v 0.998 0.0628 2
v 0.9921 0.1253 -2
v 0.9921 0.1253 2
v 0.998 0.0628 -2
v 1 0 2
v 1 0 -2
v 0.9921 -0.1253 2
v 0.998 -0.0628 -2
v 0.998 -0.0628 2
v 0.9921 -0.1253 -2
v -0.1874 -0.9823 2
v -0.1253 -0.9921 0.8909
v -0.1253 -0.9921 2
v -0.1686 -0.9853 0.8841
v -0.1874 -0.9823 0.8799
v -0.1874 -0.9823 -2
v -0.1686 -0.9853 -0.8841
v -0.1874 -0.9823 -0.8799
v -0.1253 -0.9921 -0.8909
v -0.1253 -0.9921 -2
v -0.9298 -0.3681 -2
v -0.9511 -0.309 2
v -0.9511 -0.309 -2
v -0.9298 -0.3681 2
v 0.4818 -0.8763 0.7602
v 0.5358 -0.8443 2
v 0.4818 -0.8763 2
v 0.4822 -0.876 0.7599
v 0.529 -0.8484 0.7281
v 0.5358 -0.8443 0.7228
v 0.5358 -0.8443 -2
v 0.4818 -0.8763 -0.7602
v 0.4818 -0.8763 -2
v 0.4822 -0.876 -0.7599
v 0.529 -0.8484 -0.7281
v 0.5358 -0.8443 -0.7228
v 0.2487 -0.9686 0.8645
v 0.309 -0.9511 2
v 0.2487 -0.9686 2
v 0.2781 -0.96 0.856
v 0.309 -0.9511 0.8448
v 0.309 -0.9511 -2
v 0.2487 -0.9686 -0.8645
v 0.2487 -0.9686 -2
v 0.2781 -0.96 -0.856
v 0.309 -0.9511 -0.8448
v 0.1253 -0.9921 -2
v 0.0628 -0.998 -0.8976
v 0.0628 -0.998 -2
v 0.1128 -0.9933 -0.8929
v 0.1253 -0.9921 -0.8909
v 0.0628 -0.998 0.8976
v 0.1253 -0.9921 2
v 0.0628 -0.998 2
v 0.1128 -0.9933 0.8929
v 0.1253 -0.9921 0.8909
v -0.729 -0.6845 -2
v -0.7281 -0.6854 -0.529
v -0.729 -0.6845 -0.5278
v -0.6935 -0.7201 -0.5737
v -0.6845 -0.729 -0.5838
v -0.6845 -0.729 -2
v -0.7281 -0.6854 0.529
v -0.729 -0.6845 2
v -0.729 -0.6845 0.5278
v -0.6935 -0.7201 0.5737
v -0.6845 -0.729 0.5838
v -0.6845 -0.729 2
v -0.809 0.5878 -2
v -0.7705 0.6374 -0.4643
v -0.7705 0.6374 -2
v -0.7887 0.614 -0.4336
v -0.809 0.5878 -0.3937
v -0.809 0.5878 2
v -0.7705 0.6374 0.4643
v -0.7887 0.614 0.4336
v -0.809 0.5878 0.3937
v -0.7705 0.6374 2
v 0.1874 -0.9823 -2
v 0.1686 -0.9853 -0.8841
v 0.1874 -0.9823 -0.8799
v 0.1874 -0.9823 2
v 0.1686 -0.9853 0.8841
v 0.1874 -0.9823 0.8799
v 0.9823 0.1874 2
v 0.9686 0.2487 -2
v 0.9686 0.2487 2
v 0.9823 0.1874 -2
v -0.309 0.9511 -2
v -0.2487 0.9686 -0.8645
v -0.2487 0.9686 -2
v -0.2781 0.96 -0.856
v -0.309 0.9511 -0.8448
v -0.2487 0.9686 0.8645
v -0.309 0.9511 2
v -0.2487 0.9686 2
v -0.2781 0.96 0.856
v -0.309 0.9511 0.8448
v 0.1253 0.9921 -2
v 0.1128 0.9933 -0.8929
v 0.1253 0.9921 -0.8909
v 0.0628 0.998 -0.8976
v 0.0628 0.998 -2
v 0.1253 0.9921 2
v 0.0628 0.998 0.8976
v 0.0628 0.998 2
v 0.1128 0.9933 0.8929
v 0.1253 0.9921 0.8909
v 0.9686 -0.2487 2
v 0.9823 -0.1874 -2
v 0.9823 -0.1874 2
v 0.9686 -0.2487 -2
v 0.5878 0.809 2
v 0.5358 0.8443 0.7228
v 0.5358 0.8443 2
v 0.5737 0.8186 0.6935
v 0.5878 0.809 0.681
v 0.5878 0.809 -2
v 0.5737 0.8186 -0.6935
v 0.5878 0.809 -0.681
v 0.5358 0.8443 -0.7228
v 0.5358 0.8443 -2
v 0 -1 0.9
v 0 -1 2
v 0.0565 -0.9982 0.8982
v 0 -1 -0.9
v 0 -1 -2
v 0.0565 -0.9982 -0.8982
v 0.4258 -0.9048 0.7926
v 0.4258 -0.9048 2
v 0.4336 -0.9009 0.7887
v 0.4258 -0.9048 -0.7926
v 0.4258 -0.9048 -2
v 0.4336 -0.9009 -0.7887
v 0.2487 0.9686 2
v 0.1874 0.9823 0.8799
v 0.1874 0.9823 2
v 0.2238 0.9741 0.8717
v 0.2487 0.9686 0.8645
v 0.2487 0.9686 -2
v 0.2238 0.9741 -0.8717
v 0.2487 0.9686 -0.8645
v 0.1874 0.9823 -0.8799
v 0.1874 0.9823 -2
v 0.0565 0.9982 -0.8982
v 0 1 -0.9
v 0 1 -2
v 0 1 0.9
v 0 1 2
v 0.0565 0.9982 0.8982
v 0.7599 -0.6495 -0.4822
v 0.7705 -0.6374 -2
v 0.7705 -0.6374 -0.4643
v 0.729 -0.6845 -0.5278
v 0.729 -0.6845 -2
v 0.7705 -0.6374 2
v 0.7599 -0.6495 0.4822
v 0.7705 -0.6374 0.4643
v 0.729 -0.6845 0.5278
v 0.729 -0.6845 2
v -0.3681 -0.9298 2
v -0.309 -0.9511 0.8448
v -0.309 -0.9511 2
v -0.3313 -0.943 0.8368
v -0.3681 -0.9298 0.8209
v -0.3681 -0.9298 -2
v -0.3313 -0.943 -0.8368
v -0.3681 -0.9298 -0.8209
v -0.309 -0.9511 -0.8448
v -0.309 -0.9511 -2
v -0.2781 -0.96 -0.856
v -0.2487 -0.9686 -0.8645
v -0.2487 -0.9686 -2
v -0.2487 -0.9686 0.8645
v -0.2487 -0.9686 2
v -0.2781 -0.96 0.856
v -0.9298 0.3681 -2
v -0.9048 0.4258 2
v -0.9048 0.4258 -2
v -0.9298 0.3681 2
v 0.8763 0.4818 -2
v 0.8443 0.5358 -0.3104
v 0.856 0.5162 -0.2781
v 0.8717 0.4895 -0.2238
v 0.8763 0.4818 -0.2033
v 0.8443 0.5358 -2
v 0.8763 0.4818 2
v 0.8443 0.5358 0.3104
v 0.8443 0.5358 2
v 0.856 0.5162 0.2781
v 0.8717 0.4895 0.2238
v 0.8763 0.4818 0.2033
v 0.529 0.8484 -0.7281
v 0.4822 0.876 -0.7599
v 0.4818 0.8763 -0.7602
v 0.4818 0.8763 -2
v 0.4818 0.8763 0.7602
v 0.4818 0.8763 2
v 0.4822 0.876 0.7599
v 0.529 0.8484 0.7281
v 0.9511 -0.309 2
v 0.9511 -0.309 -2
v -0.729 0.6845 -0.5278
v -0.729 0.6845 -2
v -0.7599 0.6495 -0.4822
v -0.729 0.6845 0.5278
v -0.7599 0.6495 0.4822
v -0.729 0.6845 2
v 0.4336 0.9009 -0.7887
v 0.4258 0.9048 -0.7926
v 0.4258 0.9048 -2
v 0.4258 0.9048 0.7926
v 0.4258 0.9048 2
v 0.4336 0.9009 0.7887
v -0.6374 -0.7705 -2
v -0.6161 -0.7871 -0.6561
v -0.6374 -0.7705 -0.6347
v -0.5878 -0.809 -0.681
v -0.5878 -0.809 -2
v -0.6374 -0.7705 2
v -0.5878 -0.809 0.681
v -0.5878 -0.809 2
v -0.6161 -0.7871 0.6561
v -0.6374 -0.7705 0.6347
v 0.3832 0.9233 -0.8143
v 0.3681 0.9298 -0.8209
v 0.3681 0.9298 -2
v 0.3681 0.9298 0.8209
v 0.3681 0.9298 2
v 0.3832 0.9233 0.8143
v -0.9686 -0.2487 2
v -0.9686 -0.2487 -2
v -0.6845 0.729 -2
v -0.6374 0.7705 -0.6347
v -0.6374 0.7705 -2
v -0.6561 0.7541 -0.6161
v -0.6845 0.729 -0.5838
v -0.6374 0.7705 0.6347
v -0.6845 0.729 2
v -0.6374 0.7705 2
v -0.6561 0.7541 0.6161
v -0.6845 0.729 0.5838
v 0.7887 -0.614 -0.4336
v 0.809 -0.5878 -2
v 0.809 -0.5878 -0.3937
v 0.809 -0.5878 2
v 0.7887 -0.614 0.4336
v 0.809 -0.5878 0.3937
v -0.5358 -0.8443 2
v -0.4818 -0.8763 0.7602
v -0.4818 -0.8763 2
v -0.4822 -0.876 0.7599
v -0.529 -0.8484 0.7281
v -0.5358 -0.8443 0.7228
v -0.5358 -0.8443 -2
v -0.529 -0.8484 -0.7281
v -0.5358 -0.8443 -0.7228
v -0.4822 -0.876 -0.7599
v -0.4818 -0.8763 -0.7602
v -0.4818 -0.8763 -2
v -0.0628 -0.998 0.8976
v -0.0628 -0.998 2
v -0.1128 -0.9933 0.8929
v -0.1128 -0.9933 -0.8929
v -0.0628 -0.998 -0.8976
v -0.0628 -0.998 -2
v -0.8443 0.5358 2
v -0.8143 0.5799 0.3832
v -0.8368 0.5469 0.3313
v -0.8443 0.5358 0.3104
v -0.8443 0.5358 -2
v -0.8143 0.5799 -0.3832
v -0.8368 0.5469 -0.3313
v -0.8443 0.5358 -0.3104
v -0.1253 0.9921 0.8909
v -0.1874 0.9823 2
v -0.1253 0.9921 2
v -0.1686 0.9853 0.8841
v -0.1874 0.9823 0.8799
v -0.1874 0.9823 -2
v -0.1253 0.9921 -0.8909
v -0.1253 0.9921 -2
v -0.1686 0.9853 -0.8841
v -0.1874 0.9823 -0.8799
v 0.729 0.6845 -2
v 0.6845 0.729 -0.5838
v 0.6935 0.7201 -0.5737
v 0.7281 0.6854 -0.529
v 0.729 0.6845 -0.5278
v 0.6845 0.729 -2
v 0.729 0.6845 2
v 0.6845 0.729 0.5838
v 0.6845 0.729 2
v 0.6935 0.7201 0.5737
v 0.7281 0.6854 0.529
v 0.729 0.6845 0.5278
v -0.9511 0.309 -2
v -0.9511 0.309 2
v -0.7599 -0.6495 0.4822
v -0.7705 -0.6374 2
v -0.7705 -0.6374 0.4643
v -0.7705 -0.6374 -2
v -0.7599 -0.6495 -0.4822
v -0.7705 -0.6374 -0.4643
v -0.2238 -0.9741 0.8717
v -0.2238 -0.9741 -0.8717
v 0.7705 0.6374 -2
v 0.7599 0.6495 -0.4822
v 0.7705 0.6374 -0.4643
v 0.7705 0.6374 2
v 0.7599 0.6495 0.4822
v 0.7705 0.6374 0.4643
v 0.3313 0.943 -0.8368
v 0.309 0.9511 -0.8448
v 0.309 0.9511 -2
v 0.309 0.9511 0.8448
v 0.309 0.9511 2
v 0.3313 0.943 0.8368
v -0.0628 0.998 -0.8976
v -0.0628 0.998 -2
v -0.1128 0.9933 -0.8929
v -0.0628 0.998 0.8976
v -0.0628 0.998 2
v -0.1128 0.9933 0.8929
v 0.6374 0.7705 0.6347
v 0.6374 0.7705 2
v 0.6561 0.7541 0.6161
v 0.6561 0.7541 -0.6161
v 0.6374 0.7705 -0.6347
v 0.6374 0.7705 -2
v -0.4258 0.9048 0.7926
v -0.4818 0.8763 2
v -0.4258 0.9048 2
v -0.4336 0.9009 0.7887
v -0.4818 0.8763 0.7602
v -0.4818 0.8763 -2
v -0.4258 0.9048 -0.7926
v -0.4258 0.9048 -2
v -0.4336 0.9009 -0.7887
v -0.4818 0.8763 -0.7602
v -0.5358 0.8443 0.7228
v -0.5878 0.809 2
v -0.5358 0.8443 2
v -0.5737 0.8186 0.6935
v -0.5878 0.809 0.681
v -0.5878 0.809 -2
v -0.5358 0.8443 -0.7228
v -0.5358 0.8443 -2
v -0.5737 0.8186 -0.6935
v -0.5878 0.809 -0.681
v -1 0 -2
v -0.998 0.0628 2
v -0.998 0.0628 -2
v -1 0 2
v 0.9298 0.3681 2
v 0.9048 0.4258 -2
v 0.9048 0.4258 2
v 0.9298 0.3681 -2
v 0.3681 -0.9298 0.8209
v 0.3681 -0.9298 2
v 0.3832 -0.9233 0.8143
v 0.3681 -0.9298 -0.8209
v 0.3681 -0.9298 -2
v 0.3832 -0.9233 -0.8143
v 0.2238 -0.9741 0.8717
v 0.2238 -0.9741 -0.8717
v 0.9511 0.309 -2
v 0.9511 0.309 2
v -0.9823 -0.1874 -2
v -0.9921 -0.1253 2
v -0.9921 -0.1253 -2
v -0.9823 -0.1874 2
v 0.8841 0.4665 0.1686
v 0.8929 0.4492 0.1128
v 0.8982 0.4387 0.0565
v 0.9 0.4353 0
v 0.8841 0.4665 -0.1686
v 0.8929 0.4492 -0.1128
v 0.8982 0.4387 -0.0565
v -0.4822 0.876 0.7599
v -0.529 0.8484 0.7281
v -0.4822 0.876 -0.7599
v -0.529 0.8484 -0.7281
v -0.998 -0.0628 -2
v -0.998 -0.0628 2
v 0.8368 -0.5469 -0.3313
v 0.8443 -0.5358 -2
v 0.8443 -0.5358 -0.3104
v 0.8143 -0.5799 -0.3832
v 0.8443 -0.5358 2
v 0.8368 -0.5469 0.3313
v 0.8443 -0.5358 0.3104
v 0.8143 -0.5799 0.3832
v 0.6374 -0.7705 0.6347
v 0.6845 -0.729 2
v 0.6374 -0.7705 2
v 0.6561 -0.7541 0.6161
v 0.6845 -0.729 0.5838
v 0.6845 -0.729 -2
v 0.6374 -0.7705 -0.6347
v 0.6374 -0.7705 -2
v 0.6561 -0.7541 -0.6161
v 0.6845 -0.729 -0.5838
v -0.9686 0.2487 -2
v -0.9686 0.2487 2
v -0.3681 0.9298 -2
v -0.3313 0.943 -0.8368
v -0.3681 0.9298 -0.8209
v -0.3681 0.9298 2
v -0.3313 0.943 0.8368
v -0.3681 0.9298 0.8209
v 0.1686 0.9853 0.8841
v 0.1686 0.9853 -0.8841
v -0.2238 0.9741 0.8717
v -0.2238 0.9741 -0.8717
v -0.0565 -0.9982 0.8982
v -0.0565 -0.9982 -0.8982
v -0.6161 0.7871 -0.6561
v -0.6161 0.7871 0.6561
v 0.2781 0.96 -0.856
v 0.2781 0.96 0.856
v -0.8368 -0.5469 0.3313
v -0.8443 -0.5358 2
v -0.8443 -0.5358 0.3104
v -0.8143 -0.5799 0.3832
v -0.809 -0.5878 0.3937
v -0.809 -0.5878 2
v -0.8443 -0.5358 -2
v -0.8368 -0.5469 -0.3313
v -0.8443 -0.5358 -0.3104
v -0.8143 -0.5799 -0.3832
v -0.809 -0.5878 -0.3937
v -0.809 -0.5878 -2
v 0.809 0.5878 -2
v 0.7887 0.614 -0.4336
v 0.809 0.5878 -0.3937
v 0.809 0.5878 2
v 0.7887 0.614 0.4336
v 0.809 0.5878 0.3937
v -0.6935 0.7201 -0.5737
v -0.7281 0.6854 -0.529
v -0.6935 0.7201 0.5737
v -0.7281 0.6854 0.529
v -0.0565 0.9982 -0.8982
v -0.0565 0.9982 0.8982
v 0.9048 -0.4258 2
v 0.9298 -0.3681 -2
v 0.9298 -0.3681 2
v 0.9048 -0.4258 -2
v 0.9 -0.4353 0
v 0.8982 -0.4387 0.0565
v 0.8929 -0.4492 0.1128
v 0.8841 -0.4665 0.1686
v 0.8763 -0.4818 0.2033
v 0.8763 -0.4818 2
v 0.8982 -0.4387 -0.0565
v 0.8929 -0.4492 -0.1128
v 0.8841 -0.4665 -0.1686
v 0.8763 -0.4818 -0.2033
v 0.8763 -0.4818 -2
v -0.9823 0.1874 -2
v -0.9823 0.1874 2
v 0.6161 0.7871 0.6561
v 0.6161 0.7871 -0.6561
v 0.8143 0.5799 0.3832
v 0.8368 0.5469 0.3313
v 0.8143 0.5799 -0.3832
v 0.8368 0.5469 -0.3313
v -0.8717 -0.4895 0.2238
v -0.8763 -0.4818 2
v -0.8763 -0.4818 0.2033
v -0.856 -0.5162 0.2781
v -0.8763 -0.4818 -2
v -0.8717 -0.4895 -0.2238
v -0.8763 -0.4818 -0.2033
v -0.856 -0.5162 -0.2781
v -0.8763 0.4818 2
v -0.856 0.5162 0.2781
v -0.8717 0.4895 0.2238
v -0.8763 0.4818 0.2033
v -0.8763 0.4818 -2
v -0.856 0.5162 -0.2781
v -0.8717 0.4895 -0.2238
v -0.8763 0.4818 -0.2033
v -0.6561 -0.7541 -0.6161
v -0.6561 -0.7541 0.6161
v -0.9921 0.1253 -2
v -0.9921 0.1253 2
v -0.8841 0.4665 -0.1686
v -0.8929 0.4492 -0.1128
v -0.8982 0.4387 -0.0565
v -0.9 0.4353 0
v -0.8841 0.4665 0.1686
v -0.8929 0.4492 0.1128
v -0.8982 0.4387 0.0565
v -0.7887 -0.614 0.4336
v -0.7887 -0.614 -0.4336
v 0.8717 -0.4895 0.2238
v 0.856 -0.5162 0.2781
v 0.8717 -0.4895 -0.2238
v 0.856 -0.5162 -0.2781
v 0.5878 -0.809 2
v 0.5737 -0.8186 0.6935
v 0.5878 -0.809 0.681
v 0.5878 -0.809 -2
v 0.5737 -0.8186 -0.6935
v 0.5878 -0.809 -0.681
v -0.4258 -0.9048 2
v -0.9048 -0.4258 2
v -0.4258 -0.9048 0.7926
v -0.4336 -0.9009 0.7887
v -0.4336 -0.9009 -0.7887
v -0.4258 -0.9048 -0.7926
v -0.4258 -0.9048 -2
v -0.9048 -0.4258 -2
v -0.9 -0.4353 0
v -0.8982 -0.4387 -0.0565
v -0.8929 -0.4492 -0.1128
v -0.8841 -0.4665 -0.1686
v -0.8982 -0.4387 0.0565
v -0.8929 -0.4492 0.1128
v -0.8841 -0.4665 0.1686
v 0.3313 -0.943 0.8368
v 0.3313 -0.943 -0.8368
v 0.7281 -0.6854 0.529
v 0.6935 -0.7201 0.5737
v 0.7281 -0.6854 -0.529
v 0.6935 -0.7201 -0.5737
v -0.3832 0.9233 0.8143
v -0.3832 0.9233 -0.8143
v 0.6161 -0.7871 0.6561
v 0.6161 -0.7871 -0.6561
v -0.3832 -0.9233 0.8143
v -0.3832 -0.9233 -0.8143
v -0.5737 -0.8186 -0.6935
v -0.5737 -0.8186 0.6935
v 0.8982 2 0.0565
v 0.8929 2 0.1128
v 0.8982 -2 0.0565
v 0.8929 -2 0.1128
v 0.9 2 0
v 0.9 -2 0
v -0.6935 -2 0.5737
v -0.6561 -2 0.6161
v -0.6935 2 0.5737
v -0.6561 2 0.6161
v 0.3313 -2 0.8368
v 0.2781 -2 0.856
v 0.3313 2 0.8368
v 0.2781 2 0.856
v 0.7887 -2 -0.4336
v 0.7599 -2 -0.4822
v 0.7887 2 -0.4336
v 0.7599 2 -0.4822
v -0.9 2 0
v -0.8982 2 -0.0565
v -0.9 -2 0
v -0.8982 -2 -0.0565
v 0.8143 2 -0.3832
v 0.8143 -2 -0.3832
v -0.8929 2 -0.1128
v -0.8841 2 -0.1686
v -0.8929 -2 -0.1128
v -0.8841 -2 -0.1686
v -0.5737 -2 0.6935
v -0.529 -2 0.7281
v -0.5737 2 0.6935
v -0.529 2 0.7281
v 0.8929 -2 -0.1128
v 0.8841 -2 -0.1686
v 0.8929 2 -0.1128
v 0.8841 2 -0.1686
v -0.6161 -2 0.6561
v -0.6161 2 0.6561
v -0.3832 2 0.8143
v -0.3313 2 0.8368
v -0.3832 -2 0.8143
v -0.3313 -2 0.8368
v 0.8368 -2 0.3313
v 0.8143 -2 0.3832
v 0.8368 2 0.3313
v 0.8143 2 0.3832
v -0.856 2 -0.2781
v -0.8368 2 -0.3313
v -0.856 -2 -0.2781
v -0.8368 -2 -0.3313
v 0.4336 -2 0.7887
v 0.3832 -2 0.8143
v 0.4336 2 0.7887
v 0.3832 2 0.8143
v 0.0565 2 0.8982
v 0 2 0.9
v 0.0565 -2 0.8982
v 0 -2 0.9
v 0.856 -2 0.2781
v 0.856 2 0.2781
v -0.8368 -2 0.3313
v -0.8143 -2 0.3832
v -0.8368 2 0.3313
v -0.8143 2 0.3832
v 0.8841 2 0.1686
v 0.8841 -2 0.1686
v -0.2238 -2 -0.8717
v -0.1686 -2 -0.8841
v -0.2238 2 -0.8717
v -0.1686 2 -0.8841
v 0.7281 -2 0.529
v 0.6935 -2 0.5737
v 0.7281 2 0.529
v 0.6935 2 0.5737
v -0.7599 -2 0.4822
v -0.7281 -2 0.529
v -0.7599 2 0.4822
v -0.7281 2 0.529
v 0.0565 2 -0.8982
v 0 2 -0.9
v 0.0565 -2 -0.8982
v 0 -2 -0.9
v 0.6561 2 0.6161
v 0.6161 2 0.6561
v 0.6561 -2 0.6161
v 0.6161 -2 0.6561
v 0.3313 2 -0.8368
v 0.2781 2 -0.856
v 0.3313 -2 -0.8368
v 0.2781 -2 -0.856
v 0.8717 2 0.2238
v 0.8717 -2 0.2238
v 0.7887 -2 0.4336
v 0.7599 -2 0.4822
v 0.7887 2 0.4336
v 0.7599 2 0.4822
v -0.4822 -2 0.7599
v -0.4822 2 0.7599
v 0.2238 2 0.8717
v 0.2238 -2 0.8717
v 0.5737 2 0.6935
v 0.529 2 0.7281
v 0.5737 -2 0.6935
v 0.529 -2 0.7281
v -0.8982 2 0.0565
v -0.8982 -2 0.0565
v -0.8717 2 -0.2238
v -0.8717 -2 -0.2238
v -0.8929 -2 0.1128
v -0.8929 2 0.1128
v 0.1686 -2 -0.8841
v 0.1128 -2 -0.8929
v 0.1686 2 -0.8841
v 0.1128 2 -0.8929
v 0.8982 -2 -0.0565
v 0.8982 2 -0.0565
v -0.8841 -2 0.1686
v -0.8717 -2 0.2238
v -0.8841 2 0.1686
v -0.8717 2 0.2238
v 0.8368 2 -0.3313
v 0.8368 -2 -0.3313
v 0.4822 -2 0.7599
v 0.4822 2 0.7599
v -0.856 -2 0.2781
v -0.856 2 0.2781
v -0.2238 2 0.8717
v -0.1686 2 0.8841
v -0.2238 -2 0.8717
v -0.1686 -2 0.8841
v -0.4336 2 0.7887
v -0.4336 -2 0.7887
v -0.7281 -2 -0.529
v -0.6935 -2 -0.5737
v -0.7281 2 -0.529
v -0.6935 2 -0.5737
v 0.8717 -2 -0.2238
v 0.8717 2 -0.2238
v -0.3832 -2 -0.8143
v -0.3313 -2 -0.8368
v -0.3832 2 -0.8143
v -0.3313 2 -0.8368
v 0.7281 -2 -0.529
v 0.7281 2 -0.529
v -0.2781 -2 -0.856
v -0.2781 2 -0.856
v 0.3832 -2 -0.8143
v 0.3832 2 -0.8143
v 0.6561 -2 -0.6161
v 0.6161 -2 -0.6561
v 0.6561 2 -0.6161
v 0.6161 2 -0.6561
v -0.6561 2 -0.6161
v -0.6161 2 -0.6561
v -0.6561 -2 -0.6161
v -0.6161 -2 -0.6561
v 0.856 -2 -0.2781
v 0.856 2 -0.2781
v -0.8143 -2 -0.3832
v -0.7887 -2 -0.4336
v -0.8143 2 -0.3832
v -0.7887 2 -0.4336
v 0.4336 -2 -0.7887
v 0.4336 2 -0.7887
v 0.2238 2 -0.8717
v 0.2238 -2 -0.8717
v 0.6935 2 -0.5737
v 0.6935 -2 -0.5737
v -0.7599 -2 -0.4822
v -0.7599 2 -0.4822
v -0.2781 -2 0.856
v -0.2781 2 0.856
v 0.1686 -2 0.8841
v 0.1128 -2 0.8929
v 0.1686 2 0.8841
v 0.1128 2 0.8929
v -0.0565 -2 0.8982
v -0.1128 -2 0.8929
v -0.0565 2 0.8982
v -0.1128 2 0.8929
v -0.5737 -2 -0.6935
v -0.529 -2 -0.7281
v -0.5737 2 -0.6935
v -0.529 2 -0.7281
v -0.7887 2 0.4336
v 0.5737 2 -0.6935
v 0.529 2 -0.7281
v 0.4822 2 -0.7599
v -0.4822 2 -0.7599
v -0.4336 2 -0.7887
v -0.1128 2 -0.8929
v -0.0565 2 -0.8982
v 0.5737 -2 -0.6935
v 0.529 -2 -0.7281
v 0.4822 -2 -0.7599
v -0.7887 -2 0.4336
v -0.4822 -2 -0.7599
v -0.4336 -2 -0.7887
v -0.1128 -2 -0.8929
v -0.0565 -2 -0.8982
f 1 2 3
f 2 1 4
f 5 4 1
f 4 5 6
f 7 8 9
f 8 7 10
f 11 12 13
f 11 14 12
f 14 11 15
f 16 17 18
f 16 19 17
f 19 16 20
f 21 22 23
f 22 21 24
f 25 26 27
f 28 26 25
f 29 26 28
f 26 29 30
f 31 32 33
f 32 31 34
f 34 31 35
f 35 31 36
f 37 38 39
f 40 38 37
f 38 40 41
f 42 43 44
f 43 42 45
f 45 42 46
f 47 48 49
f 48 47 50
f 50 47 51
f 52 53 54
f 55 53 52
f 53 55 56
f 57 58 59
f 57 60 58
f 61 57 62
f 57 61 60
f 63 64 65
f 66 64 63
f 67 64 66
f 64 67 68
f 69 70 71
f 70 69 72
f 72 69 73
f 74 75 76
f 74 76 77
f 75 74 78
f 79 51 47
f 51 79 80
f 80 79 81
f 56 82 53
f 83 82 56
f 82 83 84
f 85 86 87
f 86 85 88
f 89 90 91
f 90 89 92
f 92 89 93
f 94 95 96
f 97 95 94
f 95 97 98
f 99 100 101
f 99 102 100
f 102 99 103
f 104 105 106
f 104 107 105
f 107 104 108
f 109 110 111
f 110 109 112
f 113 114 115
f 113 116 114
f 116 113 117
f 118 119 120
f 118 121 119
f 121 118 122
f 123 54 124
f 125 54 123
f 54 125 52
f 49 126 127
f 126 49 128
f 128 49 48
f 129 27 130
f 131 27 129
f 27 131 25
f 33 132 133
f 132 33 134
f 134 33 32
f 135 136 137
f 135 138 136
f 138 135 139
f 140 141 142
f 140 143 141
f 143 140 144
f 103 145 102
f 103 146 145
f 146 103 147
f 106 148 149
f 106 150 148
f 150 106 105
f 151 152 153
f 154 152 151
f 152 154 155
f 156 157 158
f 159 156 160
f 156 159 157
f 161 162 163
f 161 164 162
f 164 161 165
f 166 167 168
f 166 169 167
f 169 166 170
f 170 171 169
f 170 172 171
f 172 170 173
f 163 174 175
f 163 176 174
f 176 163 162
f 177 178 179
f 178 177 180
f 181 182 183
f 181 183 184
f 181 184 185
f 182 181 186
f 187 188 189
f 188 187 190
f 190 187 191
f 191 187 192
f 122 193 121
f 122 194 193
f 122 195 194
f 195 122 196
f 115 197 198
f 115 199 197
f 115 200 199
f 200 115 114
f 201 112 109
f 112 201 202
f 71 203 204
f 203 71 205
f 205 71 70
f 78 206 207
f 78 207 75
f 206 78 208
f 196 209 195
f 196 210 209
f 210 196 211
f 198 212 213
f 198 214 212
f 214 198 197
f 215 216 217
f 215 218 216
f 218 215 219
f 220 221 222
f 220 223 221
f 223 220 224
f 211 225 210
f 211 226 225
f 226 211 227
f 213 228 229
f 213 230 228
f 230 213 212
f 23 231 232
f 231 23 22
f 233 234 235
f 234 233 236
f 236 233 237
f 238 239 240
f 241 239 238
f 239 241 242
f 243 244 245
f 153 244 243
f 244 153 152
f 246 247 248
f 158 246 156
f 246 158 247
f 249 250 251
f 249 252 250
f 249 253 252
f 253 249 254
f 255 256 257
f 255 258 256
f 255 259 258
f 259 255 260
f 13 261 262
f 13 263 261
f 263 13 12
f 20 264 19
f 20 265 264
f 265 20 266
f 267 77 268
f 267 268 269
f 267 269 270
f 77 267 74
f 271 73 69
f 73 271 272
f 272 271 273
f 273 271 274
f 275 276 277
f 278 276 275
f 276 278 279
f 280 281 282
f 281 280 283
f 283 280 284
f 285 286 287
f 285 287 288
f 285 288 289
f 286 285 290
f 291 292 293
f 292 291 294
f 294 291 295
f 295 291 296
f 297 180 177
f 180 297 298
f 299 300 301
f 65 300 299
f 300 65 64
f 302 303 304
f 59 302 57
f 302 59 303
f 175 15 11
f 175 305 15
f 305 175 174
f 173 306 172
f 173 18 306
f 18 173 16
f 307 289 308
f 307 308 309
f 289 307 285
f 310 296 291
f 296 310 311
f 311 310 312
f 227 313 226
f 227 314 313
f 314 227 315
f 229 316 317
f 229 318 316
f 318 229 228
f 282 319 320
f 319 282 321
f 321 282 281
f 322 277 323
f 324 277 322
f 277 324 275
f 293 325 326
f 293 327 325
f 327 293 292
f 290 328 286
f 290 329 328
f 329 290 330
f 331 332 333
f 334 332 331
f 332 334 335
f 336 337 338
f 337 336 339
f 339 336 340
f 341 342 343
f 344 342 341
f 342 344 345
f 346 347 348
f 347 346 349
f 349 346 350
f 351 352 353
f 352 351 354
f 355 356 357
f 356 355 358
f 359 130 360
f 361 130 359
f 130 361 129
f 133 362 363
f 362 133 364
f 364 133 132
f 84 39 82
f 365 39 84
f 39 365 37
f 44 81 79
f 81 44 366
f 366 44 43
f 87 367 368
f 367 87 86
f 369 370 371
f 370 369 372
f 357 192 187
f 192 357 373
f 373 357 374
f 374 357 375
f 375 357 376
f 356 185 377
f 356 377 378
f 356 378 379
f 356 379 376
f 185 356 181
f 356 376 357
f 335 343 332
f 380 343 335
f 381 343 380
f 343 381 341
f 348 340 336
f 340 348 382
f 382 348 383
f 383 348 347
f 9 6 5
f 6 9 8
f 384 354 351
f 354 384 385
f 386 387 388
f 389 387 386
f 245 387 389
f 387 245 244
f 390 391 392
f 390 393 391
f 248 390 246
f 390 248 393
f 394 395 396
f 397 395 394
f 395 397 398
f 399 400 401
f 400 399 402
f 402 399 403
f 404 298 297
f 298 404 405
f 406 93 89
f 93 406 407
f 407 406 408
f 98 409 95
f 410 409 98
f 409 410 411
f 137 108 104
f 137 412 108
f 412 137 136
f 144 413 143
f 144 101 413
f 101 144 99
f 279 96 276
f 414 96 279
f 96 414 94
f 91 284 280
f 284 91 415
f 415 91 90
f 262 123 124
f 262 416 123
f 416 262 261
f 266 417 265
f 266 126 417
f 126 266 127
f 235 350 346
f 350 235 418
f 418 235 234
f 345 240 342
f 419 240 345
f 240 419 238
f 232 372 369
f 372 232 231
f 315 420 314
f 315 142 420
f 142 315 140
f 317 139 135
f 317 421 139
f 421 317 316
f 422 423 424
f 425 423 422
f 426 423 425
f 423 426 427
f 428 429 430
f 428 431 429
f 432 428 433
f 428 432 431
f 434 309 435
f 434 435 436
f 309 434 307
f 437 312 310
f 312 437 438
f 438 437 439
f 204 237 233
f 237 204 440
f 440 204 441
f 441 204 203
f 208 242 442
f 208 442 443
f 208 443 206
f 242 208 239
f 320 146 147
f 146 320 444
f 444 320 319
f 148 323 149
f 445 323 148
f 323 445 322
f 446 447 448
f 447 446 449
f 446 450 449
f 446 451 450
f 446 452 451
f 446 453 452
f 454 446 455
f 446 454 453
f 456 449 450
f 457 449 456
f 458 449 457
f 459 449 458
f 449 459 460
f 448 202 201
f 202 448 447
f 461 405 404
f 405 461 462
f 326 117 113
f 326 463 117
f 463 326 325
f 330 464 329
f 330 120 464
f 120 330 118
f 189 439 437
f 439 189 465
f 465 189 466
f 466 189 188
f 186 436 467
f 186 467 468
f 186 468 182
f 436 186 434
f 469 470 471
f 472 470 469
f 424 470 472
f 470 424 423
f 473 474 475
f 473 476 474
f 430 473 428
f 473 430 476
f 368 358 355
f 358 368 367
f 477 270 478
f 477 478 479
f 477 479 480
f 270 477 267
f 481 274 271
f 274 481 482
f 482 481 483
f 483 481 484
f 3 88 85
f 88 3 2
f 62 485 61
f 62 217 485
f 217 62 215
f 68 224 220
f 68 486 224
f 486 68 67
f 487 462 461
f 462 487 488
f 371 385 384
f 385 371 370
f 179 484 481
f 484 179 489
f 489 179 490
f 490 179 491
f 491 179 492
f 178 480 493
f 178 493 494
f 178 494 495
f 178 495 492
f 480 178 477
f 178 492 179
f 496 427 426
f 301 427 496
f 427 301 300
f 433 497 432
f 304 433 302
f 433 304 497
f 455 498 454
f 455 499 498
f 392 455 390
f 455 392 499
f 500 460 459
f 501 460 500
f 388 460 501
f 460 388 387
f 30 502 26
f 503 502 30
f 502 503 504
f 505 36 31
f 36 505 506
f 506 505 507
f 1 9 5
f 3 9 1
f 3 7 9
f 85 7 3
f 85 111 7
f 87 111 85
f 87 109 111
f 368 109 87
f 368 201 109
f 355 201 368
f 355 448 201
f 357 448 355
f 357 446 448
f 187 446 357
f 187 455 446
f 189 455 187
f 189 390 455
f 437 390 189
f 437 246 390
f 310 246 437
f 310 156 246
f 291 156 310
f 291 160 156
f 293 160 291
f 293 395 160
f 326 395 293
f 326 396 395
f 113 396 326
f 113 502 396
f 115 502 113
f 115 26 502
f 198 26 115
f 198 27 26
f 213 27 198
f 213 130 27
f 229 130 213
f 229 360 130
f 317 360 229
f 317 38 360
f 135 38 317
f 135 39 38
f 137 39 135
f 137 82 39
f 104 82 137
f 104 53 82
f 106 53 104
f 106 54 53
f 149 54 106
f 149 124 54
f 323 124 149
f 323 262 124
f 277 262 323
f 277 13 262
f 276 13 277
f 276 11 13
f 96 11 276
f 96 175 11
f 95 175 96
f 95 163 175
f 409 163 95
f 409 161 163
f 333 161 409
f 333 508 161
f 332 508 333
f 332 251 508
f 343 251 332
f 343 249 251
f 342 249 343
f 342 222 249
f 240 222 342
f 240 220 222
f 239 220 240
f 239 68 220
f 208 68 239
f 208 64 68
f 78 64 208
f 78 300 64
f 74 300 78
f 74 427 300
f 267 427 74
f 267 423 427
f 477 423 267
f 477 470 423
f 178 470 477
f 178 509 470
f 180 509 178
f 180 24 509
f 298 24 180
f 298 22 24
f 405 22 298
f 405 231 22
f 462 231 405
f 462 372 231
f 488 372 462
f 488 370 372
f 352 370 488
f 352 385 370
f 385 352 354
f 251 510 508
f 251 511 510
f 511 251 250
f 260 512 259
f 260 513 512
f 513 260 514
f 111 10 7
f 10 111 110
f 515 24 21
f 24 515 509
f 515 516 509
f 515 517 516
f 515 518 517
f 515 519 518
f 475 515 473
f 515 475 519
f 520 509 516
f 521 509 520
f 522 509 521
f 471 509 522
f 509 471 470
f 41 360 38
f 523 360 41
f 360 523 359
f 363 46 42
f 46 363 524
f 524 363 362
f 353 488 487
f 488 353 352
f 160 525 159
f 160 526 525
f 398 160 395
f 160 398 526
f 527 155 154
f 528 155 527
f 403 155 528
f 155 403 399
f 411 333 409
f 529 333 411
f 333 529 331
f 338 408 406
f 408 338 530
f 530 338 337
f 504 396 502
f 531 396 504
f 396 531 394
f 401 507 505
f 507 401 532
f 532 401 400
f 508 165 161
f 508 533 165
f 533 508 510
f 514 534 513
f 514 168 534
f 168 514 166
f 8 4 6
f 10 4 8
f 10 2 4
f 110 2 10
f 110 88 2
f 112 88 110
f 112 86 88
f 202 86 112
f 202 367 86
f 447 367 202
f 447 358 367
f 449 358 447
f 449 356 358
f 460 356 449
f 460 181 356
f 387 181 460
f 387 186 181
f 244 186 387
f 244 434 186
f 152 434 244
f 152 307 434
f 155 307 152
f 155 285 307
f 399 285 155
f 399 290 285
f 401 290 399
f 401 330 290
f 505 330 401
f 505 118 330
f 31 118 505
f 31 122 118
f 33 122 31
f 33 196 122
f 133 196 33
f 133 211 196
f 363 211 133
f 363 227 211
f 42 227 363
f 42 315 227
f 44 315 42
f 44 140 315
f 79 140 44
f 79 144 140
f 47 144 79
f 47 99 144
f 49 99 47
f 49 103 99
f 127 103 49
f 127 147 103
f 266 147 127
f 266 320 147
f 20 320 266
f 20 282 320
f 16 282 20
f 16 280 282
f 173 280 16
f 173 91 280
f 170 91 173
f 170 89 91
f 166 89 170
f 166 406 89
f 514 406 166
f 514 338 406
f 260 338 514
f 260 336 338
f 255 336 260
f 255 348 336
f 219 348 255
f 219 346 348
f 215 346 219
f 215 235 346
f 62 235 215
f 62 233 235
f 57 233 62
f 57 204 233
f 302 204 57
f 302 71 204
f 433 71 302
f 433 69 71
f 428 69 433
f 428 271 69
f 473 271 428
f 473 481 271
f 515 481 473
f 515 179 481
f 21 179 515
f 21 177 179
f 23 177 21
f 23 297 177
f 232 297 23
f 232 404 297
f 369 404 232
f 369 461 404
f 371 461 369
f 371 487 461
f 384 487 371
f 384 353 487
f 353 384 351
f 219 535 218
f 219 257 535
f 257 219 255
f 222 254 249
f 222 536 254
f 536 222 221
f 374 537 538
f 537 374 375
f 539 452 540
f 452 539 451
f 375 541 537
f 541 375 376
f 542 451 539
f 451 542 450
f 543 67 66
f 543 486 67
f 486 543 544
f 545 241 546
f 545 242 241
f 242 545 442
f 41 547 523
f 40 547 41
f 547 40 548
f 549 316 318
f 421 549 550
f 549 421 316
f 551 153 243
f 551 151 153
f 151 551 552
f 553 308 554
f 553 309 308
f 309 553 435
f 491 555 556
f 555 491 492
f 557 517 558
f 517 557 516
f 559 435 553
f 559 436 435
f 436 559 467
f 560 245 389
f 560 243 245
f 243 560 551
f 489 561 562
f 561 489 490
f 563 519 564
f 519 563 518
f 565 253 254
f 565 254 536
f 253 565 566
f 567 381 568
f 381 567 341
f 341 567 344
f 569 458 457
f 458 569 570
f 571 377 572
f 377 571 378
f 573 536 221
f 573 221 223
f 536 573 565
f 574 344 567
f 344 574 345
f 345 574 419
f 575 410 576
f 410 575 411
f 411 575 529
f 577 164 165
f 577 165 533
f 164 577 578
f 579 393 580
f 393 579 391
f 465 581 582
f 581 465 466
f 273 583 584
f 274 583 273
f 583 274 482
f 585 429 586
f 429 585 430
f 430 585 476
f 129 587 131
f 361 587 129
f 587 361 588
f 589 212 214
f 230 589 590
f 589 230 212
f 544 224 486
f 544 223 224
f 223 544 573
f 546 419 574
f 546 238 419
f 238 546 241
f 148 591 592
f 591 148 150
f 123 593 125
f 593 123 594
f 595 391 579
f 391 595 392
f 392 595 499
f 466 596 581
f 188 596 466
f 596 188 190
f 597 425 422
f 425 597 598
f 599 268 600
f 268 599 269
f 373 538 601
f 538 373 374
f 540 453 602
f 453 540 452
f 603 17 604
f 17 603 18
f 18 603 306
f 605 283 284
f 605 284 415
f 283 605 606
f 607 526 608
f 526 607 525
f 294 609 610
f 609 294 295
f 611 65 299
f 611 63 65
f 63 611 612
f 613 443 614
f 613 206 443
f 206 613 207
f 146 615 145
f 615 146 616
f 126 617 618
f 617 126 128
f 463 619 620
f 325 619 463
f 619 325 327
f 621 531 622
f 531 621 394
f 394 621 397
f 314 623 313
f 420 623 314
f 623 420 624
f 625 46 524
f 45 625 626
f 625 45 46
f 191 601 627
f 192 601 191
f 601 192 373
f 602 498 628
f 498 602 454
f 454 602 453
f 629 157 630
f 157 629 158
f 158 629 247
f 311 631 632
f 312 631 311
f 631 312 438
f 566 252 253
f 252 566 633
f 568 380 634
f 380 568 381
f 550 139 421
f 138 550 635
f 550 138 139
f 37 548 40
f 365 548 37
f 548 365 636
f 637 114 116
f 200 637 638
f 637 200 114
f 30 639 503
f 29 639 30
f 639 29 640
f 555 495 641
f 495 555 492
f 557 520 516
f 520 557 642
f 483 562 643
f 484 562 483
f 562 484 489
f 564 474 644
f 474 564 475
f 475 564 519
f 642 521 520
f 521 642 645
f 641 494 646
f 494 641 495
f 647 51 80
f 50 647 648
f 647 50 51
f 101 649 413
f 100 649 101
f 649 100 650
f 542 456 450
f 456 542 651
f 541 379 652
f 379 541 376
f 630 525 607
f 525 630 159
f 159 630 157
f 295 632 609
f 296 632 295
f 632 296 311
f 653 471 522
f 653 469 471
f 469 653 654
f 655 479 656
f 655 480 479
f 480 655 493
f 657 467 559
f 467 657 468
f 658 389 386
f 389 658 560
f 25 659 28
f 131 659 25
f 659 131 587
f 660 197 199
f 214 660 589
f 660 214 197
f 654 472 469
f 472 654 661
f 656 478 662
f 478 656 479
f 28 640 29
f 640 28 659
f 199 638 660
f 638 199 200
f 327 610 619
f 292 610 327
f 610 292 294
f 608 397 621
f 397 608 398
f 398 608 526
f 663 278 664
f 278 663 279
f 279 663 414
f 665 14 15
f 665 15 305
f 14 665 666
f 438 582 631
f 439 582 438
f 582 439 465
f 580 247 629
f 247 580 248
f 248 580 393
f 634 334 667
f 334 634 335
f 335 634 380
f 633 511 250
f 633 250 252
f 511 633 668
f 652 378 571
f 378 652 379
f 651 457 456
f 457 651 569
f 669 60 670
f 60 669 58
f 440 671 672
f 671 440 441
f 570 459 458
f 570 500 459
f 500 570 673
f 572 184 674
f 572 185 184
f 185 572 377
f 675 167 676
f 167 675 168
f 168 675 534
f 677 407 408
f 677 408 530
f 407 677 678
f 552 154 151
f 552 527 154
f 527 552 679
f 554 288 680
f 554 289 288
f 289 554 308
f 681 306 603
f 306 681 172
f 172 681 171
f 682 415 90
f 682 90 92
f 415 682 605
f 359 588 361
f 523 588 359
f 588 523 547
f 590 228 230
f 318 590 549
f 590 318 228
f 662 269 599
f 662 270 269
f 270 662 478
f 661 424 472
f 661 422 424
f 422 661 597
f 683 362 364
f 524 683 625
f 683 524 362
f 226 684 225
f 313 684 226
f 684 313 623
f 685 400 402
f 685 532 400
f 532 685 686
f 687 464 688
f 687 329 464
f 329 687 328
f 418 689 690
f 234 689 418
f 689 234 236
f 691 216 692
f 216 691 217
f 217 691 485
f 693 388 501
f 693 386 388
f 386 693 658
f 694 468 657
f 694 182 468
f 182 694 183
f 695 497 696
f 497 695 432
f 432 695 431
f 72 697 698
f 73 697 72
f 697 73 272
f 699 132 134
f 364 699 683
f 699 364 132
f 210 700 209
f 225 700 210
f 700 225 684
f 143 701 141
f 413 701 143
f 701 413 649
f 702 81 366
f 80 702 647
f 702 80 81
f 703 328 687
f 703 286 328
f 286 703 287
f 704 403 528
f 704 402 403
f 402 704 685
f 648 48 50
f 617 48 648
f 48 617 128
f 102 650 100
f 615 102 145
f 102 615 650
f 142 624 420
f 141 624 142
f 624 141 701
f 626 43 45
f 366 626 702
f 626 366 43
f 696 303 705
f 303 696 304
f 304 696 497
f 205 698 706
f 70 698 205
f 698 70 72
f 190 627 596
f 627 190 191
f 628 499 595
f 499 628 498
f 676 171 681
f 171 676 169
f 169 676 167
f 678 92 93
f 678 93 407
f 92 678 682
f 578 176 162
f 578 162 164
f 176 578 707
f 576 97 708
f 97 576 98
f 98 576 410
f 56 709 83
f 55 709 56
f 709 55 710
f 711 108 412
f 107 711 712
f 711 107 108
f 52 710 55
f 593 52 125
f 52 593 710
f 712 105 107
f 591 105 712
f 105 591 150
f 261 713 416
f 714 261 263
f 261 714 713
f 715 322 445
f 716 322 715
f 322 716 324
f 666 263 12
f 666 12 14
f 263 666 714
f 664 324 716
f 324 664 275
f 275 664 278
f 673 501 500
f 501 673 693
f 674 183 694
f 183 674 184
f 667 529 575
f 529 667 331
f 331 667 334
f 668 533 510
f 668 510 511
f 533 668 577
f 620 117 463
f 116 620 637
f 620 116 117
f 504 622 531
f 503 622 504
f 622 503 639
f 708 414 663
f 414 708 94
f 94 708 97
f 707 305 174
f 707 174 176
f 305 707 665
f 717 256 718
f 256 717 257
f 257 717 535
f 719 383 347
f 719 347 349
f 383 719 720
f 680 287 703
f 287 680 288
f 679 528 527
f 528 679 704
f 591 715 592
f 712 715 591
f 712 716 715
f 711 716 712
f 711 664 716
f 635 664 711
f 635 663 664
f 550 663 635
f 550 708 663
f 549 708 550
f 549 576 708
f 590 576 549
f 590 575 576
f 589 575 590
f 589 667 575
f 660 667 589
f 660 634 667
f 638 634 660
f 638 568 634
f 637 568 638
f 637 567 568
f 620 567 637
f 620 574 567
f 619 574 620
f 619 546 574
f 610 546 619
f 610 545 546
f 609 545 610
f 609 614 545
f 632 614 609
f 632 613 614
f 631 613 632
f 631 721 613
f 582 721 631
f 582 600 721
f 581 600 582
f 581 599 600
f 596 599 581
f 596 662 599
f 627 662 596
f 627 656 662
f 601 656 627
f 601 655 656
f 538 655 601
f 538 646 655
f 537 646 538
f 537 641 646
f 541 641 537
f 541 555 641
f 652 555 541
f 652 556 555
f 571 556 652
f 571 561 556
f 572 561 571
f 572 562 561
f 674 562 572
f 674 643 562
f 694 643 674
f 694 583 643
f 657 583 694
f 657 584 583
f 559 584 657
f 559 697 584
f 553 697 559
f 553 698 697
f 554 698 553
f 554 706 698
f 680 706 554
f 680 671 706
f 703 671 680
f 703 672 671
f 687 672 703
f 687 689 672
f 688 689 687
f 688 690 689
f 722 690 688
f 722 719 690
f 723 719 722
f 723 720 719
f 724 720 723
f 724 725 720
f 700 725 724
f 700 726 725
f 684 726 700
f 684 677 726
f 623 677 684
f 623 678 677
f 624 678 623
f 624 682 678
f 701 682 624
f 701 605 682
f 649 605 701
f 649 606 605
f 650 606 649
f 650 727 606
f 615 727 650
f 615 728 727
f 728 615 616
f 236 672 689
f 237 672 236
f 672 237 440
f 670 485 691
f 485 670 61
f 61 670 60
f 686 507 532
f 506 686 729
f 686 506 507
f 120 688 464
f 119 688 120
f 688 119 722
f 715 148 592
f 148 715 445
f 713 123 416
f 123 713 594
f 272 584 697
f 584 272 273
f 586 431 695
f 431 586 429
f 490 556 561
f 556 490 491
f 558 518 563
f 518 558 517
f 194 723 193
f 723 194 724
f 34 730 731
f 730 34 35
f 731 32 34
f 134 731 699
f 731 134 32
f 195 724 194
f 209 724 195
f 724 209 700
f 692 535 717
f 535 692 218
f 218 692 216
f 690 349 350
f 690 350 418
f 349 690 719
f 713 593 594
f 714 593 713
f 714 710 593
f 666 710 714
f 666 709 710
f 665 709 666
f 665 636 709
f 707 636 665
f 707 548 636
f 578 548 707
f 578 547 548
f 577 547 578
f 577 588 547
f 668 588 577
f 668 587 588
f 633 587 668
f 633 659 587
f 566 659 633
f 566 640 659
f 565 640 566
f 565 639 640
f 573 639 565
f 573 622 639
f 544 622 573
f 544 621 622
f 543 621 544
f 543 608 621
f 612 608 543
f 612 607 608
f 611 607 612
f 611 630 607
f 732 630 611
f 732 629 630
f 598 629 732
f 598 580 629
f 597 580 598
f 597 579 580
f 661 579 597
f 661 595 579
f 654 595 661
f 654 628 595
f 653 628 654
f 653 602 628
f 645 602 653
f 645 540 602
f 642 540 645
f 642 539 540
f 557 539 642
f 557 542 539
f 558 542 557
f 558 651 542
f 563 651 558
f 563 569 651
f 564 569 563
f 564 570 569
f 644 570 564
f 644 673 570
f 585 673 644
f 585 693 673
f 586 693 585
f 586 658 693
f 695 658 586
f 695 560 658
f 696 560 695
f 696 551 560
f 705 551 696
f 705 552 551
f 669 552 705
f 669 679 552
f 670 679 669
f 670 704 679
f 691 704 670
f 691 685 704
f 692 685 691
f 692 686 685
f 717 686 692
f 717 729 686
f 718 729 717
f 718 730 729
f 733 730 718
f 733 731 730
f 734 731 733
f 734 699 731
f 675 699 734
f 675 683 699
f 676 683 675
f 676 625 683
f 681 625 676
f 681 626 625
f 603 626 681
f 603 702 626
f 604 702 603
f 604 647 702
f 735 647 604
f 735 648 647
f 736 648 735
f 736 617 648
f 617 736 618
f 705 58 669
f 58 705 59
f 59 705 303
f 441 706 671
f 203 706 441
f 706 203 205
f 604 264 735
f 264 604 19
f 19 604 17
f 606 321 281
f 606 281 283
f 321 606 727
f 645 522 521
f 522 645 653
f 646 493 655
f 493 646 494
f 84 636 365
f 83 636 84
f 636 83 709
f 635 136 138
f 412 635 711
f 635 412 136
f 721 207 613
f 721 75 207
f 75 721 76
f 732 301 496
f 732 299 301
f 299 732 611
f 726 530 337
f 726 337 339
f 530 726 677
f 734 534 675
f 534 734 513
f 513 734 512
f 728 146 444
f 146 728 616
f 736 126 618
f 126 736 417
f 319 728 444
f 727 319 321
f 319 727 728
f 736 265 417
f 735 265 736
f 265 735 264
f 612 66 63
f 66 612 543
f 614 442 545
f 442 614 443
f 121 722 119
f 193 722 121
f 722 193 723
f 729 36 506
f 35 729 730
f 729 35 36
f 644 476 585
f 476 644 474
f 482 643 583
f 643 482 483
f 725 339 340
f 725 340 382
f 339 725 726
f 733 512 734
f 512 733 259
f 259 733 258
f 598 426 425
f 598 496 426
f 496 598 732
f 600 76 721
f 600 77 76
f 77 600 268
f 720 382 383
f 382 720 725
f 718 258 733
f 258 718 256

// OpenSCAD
// Unit of length: Unit.MM
union()
{
   cylinder(h = 4.0, d = 2.0, center = true, $fn = 100);
   rotate(a = [90.0, 0.0, 0.0])
   {
      cylinder(h = 4.0, d = 1.8, center = true, $fn = 100);
   }
}
